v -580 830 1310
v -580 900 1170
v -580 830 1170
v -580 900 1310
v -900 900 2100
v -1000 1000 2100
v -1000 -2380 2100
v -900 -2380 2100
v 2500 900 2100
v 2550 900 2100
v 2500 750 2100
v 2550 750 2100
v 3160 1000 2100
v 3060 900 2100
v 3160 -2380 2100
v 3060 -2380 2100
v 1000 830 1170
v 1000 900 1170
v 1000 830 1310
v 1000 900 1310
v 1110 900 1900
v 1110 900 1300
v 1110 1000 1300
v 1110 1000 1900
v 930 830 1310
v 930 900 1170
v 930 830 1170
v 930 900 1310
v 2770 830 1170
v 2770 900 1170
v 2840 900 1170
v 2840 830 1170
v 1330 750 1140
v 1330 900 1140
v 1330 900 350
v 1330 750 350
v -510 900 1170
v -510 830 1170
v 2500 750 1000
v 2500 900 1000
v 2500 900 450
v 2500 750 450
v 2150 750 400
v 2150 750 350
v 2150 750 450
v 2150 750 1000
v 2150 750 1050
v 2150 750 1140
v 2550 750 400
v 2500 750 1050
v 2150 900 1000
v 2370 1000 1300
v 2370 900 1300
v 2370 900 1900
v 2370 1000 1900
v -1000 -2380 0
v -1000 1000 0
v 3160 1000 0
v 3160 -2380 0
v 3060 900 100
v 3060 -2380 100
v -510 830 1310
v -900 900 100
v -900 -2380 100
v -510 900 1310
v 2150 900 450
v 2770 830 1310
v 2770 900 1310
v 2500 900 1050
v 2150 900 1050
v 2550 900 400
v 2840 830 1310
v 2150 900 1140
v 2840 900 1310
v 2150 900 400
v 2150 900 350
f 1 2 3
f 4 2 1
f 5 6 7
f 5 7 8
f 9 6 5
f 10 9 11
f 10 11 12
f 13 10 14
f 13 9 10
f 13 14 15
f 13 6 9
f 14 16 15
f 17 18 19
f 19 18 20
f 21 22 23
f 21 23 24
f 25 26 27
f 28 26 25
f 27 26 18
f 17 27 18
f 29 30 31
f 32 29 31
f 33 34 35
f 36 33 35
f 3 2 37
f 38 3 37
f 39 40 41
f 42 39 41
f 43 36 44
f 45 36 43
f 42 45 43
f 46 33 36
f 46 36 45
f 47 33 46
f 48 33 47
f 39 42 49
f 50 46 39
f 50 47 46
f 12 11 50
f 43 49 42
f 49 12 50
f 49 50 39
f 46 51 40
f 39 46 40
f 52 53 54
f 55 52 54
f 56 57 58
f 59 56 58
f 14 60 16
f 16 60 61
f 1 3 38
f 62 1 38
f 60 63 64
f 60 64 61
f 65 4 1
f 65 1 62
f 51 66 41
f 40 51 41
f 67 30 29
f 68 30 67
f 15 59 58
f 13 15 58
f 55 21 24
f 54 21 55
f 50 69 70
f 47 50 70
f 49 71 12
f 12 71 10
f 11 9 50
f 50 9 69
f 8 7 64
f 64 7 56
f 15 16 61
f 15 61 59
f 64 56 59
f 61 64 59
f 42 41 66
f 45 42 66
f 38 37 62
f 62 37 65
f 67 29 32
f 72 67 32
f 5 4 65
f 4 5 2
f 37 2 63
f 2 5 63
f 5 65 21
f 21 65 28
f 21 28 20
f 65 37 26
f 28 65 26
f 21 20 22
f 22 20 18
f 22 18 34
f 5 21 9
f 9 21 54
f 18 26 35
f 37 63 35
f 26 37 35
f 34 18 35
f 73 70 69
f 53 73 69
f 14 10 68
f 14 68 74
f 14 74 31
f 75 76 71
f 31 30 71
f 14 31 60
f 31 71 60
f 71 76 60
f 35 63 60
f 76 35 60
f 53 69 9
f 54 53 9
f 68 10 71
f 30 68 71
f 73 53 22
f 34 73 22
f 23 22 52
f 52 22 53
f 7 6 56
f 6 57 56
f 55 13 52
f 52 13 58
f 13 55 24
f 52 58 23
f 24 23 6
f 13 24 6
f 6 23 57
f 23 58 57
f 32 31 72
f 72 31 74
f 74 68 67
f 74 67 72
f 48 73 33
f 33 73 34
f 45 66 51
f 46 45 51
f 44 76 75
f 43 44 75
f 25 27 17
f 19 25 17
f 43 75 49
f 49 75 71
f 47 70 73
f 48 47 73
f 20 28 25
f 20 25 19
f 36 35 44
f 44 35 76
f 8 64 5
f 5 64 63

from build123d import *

# Parameters (mm, degrees)
F0_W     = 4160
F0_H     = 3380
F1_DEPTH = 100
F3_DEPTH = 2000
F4_W     = 1260
F4_H     = 600
F5_DEPTH = 100.001
F7_DEPTH = 150
F8_W     = 70
F8_H     = 140
F9_DEPTH = 70


with BuildPart() as f1:
    # F0 (on Top) → F1 (new body)
    with BuildSketch(Plane.XY):
        with Locations((1080, -690)):
            Rectangle(F0_W, F0_H)
    extrude(amount=F1_DEPTH)

    # F2 (on face) → F3 (join)
    with BuildSketch(Plane.XY.offset(100)):
        Polygon((3160, 1000), (-1000, 1000), (-1000, -2380), (-900, -2380), (-900, 900), (3060, 900), (3060, -2380), (3160, -2380), align=None)
    extrude(amount=F3_DEPTH)

    # F4 (on face) → F5 (cut, through all)
    with BuildSketch(Plane.XZ.offset(-900)):
        with Locations((1740, 1600)):
            Rectangle(F4_W, F4_H)
    extrude(amount=-F5_DEPTH, mode=Mode.SUBTRACT)

    # F6 (on face) → F7 (join)
    with BuildSketch(Plane.XZ.offset(-900)):
        Polygon((2150, 1140), (1330, 1140), (1330, 350), (2150, 350), (2150, 400), (2150, 450), (2150, 1000), (2150, 1050), align=None)
        Polygon((2500, 1050), (2150, 1050), (2150, 1000), (2500, 1000), (2550, 1000), (2550, 2100), (2500, 2100), align=None)
        Polygon((2150, 450), (2150, 400), (2550, 400), (2550, 1000), (2500, 1000), (2500, 450), align=None)
    extrude(amount=F7_DEPTH)

    # F8 (on face) → F9 (join)
    with BuildSketch(Plane.XZ.offset(-900)):
        with Locations((-545, 1240)):
            Rectangle(F8_W, F8_H)
        with Locations((965, 1240)):
            Rectangle(F8_W, F8_H)
        with Locations((2805, 1240)):
            Rectangle(F8_W, F8_H)
    extrude(amount=F9_DEPTH)


solid = f1.part
